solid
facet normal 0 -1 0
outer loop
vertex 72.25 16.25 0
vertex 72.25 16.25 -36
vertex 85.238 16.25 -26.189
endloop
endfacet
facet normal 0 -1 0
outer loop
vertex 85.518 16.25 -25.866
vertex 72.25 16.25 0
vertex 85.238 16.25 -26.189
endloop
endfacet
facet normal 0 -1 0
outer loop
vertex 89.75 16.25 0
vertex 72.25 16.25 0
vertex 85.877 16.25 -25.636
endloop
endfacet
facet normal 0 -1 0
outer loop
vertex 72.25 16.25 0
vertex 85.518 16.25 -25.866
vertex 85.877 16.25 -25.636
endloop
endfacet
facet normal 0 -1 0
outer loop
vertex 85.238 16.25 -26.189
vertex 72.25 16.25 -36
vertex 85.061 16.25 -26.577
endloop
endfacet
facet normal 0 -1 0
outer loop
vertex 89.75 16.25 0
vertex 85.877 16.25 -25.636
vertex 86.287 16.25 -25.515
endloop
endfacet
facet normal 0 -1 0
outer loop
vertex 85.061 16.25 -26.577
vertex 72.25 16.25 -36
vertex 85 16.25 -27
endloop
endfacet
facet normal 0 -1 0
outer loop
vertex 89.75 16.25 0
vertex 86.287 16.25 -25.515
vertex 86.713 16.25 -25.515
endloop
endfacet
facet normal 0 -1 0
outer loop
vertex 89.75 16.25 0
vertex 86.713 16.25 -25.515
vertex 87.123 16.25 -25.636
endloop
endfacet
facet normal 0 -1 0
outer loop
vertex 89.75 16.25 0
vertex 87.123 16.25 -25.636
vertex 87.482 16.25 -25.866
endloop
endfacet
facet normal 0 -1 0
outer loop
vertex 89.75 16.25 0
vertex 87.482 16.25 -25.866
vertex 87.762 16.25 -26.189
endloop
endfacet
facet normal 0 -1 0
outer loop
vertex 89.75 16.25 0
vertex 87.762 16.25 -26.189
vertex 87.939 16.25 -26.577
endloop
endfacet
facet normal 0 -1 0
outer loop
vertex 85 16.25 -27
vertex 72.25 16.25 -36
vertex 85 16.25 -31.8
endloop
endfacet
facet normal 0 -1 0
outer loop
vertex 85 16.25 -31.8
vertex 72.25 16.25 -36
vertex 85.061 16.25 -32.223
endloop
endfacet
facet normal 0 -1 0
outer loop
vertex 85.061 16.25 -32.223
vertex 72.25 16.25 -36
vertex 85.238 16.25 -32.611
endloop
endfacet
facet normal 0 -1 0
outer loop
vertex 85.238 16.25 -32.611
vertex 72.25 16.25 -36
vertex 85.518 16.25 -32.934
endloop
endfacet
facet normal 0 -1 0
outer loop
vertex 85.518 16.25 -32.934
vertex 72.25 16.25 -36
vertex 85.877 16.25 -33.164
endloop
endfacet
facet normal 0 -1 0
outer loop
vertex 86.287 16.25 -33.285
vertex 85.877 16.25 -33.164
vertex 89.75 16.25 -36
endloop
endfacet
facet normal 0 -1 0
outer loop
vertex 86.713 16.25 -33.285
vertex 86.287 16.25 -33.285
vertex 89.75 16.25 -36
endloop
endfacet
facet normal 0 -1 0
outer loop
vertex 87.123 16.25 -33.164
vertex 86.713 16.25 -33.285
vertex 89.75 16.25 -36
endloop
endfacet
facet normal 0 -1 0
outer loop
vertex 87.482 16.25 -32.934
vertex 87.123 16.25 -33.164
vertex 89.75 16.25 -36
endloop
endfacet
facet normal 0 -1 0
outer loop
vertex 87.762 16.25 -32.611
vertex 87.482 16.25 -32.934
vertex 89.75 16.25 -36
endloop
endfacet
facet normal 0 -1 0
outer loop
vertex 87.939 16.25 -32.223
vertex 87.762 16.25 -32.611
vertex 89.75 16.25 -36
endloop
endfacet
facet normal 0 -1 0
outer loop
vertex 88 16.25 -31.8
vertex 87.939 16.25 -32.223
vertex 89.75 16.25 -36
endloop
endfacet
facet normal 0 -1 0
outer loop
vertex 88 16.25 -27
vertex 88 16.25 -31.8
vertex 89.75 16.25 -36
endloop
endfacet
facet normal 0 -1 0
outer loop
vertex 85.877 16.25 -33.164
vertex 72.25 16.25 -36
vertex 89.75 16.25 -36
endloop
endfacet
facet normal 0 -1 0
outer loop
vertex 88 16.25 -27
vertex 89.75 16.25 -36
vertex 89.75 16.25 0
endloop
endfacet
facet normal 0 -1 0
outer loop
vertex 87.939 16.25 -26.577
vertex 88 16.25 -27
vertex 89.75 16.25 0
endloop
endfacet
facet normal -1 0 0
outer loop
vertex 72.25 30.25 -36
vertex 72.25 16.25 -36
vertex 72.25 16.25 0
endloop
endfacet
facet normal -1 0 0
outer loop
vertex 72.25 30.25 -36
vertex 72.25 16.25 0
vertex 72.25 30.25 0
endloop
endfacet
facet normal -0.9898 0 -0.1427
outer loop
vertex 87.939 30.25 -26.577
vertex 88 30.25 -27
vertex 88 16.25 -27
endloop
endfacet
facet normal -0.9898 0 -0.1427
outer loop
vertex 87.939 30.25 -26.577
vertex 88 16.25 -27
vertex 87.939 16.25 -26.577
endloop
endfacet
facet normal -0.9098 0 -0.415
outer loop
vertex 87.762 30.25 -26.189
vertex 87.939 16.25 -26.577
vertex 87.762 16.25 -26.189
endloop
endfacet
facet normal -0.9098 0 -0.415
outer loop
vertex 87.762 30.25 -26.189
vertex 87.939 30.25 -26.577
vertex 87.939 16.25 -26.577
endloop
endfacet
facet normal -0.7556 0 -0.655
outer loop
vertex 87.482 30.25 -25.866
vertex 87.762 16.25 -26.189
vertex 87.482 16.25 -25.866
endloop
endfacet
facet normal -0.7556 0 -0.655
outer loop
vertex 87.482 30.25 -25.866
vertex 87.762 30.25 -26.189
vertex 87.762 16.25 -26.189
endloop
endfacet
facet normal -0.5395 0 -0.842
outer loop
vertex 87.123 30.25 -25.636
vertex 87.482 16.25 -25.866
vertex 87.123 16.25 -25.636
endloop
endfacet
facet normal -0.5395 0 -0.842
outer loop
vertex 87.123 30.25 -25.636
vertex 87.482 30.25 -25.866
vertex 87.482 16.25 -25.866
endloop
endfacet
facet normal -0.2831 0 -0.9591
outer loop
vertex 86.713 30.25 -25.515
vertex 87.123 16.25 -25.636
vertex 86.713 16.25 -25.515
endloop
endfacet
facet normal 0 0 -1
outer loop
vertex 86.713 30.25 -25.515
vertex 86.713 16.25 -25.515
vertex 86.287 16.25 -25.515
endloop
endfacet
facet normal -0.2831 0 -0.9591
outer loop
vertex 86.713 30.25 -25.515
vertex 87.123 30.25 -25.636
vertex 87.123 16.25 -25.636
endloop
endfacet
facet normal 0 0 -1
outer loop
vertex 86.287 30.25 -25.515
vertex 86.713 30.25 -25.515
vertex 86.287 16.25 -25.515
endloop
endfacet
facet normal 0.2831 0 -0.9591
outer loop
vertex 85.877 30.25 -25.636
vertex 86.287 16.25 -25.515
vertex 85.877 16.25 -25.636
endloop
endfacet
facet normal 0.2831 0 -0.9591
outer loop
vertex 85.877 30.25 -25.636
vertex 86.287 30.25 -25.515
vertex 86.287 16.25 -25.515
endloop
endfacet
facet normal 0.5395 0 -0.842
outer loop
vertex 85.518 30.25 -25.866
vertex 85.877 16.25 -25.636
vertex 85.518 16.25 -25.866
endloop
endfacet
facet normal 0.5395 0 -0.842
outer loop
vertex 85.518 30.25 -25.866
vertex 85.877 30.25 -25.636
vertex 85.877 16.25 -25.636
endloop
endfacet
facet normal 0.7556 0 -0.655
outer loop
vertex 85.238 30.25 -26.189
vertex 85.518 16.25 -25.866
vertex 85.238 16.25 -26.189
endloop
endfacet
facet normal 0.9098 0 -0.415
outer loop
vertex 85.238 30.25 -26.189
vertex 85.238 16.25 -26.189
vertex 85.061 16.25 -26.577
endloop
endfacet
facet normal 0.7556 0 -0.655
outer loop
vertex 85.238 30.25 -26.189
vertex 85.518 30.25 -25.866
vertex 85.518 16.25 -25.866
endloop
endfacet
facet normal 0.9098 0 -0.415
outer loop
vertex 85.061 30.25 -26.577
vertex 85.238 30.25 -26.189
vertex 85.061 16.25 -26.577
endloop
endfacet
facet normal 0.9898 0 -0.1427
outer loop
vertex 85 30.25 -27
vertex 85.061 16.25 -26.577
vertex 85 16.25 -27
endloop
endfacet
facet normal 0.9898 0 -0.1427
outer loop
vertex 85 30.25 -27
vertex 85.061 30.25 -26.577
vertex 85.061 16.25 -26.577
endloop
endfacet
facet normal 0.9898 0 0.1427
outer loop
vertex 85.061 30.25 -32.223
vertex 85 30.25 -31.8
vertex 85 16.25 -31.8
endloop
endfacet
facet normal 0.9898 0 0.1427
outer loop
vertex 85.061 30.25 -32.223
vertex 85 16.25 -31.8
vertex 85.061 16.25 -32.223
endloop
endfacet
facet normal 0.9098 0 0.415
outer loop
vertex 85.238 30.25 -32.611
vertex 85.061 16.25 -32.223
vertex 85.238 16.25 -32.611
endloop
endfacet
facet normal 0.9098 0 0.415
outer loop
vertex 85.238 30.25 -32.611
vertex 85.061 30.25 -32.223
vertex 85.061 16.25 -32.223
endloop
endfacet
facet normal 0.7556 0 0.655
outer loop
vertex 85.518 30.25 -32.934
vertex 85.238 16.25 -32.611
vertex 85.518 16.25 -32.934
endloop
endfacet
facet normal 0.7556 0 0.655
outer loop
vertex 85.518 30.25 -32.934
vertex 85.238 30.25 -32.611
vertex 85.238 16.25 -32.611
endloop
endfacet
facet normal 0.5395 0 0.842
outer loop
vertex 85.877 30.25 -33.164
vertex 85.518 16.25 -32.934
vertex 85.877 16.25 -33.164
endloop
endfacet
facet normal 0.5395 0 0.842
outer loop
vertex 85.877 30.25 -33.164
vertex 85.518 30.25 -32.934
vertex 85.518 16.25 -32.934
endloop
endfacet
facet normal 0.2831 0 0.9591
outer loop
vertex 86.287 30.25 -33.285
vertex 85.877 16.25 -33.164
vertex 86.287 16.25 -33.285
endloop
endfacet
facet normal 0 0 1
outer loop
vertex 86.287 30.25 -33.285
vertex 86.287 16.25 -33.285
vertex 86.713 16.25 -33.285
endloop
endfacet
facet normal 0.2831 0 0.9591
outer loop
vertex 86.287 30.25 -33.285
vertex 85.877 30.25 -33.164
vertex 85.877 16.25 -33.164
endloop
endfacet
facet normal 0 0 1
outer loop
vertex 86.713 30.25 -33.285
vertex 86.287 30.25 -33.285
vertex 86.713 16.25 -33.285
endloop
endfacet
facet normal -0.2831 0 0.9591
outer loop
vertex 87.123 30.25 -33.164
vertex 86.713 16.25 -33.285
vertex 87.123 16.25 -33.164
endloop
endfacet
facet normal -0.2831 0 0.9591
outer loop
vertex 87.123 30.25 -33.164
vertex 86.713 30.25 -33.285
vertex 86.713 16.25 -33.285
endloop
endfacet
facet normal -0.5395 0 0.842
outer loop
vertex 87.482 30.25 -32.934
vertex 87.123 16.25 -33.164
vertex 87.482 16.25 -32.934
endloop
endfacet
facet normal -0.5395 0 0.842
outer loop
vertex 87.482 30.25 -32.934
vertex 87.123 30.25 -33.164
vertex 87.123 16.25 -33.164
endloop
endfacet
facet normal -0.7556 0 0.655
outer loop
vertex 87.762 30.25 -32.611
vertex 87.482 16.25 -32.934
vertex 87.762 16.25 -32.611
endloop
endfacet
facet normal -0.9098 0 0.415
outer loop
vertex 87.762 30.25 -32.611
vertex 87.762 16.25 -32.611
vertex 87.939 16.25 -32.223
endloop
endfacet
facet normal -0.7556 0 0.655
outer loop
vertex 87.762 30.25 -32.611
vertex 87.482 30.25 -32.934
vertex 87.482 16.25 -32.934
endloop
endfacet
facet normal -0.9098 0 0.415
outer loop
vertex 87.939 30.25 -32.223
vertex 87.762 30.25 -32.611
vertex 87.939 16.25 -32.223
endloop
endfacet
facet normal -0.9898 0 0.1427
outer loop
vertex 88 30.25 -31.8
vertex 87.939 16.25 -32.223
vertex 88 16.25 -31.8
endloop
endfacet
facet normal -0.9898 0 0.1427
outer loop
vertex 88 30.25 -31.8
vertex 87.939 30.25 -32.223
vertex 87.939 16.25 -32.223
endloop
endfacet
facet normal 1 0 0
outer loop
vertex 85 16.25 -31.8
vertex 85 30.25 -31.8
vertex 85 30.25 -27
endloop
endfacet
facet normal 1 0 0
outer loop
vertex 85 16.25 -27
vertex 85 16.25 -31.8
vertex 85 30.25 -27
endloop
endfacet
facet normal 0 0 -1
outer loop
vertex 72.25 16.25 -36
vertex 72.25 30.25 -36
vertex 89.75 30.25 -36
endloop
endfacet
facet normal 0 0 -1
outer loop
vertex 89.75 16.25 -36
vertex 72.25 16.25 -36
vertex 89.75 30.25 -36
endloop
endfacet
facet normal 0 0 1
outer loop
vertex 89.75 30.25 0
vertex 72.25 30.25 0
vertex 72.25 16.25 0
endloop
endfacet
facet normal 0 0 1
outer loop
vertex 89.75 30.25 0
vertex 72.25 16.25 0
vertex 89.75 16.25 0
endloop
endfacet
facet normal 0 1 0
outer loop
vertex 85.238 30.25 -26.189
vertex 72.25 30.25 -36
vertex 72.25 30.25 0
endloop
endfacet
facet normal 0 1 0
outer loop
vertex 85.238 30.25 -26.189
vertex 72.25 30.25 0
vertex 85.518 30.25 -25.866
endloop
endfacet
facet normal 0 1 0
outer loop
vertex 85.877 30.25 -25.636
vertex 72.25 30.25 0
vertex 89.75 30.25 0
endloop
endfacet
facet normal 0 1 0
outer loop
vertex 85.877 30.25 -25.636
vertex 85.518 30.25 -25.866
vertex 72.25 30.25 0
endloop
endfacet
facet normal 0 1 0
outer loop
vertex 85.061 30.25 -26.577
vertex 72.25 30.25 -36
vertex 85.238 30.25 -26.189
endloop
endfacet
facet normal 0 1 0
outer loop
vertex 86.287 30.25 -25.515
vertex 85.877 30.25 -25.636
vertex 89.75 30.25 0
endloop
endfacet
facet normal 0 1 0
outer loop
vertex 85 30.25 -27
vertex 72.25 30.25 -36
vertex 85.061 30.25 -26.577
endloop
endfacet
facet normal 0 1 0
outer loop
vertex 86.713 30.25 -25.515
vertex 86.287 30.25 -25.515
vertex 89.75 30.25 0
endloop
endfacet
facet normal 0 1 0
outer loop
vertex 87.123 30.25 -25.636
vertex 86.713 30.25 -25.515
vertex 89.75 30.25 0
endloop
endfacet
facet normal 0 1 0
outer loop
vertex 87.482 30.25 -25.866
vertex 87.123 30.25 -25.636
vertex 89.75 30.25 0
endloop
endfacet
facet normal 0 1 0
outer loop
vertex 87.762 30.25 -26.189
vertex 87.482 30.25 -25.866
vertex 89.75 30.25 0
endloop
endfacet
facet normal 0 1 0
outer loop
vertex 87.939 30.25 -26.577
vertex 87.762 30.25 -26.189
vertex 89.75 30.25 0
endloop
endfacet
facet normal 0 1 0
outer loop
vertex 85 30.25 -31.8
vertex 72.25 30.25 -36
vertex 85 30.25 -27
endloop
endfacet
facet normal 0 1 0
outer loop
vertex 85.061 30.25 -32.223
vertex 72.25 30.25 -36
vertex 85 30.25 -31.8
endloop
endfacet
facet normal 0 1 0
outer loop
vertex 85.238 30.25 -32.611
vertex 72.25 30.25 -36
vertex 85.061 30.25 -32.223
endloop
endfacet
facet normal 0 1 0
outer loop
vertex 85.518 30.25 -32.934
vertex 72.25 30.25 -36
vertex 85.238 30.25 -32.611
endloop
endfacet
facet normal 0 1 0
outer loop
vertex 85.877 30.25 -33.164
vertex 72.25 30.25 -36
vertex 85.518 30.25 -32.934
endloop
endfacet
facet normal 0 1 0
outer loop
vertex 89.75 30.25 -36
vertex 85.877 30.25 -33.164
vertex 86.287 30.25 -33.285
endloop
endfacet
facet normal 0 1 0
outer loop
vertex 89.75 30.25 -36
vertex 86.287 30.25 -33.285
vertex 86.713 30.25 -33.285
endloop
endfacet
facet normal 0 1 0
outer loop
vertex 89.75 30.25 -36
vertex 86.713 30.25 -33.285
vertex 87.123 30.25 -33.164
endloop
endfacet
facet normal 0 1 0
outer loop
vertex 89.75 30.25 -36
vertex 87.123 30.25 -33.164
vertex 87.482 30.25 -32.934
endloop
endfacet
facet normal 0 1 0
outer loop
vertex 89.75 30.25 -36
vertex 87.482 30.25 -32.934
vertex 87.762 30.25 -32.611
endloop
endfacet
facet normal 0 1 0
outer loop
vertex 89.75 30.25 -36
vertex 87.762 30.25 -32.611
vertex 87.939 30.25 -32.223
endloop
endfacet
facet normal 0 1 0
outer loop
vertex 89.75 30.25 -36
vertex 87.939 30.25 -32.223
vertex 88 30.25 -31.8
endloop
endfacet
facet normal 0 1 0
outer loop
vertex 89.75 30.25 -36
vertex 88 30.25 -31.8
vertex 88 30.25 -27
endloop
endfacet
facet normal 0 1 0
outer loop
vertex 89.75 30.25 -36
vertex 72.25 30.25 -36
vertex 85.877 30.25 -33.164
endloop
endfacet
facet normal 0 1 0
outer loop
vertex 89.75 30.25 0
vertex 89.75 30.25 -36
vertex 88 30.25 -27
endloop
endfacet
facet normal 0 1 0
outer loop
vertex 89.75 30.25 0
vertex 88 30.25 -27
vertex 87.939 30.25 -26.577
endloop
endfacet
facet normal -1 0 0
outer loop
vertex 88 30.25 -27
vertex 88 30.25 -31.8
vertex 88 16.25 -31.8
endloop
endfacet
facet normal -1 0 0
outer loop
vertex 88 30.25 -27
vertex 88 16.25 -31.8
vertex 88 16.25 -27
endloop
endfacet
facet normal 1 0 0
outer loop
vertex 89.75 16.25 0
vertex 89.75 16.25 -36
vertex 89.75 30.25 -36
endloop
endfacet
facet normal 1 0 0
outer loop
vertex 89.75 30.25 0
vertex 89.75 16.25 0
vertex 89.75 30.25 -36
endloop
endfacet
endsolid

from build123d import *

# Parameters (mm, degrees)
EXTRUDE010_DEPTH           = 14
EXTRUDE010_PLACEMENT_ANGLE = 90
BOX023_W                   = 17.5
BOX023_H                   = 14
BOX023_DEPTH               = 36


with BuildPart() as extrude010:
    # Sketch014 → Extrude010 (new body)
    with BuildSketch(Plane.XZ):
        with BuildLine():
            ThreePointArc((-4.8, 1.5), (-6.3, 0), (-4.8, -1.5))
            Line((-4.8, -1.5), (0, -1.5))
            ThreePointArc((0, -1.5), (1.5, 0), (0, 1.5))
            Line((-4.8, 1.5), (0, 1.5))
        make_face()
    extrude(amount=EXTRUDE010_DEPTH)


with BuildPart() as extrude010_1:
    # Extrude010 placement: moved
    add(extrude010.part.moved(Location((86.5, 27.25, -27))).rotate(Axis((86.5, 27.25, -27), (0, -1, 0)), EXTRUDE010_PLACEMENT_ANGLE))


with BuildPart() as cut005:
    # Box023 → Box023 (new body)
    with BuildSketch(Plane(origin=(72.25, 13.25, -36), x_dir=(1, 0, 0), z_dir=(0, 0, 1))):
        with Locations((8.75, 7)):
            Rectangle(BOX023_W, BOX023_H)
    extrude(amount=BOX023_DEPTH)

    # Cut005: cut Extrude010
    add(extrude010_1.part, mode=Mode.SUBTRACT)


with BuildPart() as cut005_1:
    # Cut005 placement: moved
    add(cut005.part.moved(Location((0, 3, 0))))


solid = cut005_1.part
